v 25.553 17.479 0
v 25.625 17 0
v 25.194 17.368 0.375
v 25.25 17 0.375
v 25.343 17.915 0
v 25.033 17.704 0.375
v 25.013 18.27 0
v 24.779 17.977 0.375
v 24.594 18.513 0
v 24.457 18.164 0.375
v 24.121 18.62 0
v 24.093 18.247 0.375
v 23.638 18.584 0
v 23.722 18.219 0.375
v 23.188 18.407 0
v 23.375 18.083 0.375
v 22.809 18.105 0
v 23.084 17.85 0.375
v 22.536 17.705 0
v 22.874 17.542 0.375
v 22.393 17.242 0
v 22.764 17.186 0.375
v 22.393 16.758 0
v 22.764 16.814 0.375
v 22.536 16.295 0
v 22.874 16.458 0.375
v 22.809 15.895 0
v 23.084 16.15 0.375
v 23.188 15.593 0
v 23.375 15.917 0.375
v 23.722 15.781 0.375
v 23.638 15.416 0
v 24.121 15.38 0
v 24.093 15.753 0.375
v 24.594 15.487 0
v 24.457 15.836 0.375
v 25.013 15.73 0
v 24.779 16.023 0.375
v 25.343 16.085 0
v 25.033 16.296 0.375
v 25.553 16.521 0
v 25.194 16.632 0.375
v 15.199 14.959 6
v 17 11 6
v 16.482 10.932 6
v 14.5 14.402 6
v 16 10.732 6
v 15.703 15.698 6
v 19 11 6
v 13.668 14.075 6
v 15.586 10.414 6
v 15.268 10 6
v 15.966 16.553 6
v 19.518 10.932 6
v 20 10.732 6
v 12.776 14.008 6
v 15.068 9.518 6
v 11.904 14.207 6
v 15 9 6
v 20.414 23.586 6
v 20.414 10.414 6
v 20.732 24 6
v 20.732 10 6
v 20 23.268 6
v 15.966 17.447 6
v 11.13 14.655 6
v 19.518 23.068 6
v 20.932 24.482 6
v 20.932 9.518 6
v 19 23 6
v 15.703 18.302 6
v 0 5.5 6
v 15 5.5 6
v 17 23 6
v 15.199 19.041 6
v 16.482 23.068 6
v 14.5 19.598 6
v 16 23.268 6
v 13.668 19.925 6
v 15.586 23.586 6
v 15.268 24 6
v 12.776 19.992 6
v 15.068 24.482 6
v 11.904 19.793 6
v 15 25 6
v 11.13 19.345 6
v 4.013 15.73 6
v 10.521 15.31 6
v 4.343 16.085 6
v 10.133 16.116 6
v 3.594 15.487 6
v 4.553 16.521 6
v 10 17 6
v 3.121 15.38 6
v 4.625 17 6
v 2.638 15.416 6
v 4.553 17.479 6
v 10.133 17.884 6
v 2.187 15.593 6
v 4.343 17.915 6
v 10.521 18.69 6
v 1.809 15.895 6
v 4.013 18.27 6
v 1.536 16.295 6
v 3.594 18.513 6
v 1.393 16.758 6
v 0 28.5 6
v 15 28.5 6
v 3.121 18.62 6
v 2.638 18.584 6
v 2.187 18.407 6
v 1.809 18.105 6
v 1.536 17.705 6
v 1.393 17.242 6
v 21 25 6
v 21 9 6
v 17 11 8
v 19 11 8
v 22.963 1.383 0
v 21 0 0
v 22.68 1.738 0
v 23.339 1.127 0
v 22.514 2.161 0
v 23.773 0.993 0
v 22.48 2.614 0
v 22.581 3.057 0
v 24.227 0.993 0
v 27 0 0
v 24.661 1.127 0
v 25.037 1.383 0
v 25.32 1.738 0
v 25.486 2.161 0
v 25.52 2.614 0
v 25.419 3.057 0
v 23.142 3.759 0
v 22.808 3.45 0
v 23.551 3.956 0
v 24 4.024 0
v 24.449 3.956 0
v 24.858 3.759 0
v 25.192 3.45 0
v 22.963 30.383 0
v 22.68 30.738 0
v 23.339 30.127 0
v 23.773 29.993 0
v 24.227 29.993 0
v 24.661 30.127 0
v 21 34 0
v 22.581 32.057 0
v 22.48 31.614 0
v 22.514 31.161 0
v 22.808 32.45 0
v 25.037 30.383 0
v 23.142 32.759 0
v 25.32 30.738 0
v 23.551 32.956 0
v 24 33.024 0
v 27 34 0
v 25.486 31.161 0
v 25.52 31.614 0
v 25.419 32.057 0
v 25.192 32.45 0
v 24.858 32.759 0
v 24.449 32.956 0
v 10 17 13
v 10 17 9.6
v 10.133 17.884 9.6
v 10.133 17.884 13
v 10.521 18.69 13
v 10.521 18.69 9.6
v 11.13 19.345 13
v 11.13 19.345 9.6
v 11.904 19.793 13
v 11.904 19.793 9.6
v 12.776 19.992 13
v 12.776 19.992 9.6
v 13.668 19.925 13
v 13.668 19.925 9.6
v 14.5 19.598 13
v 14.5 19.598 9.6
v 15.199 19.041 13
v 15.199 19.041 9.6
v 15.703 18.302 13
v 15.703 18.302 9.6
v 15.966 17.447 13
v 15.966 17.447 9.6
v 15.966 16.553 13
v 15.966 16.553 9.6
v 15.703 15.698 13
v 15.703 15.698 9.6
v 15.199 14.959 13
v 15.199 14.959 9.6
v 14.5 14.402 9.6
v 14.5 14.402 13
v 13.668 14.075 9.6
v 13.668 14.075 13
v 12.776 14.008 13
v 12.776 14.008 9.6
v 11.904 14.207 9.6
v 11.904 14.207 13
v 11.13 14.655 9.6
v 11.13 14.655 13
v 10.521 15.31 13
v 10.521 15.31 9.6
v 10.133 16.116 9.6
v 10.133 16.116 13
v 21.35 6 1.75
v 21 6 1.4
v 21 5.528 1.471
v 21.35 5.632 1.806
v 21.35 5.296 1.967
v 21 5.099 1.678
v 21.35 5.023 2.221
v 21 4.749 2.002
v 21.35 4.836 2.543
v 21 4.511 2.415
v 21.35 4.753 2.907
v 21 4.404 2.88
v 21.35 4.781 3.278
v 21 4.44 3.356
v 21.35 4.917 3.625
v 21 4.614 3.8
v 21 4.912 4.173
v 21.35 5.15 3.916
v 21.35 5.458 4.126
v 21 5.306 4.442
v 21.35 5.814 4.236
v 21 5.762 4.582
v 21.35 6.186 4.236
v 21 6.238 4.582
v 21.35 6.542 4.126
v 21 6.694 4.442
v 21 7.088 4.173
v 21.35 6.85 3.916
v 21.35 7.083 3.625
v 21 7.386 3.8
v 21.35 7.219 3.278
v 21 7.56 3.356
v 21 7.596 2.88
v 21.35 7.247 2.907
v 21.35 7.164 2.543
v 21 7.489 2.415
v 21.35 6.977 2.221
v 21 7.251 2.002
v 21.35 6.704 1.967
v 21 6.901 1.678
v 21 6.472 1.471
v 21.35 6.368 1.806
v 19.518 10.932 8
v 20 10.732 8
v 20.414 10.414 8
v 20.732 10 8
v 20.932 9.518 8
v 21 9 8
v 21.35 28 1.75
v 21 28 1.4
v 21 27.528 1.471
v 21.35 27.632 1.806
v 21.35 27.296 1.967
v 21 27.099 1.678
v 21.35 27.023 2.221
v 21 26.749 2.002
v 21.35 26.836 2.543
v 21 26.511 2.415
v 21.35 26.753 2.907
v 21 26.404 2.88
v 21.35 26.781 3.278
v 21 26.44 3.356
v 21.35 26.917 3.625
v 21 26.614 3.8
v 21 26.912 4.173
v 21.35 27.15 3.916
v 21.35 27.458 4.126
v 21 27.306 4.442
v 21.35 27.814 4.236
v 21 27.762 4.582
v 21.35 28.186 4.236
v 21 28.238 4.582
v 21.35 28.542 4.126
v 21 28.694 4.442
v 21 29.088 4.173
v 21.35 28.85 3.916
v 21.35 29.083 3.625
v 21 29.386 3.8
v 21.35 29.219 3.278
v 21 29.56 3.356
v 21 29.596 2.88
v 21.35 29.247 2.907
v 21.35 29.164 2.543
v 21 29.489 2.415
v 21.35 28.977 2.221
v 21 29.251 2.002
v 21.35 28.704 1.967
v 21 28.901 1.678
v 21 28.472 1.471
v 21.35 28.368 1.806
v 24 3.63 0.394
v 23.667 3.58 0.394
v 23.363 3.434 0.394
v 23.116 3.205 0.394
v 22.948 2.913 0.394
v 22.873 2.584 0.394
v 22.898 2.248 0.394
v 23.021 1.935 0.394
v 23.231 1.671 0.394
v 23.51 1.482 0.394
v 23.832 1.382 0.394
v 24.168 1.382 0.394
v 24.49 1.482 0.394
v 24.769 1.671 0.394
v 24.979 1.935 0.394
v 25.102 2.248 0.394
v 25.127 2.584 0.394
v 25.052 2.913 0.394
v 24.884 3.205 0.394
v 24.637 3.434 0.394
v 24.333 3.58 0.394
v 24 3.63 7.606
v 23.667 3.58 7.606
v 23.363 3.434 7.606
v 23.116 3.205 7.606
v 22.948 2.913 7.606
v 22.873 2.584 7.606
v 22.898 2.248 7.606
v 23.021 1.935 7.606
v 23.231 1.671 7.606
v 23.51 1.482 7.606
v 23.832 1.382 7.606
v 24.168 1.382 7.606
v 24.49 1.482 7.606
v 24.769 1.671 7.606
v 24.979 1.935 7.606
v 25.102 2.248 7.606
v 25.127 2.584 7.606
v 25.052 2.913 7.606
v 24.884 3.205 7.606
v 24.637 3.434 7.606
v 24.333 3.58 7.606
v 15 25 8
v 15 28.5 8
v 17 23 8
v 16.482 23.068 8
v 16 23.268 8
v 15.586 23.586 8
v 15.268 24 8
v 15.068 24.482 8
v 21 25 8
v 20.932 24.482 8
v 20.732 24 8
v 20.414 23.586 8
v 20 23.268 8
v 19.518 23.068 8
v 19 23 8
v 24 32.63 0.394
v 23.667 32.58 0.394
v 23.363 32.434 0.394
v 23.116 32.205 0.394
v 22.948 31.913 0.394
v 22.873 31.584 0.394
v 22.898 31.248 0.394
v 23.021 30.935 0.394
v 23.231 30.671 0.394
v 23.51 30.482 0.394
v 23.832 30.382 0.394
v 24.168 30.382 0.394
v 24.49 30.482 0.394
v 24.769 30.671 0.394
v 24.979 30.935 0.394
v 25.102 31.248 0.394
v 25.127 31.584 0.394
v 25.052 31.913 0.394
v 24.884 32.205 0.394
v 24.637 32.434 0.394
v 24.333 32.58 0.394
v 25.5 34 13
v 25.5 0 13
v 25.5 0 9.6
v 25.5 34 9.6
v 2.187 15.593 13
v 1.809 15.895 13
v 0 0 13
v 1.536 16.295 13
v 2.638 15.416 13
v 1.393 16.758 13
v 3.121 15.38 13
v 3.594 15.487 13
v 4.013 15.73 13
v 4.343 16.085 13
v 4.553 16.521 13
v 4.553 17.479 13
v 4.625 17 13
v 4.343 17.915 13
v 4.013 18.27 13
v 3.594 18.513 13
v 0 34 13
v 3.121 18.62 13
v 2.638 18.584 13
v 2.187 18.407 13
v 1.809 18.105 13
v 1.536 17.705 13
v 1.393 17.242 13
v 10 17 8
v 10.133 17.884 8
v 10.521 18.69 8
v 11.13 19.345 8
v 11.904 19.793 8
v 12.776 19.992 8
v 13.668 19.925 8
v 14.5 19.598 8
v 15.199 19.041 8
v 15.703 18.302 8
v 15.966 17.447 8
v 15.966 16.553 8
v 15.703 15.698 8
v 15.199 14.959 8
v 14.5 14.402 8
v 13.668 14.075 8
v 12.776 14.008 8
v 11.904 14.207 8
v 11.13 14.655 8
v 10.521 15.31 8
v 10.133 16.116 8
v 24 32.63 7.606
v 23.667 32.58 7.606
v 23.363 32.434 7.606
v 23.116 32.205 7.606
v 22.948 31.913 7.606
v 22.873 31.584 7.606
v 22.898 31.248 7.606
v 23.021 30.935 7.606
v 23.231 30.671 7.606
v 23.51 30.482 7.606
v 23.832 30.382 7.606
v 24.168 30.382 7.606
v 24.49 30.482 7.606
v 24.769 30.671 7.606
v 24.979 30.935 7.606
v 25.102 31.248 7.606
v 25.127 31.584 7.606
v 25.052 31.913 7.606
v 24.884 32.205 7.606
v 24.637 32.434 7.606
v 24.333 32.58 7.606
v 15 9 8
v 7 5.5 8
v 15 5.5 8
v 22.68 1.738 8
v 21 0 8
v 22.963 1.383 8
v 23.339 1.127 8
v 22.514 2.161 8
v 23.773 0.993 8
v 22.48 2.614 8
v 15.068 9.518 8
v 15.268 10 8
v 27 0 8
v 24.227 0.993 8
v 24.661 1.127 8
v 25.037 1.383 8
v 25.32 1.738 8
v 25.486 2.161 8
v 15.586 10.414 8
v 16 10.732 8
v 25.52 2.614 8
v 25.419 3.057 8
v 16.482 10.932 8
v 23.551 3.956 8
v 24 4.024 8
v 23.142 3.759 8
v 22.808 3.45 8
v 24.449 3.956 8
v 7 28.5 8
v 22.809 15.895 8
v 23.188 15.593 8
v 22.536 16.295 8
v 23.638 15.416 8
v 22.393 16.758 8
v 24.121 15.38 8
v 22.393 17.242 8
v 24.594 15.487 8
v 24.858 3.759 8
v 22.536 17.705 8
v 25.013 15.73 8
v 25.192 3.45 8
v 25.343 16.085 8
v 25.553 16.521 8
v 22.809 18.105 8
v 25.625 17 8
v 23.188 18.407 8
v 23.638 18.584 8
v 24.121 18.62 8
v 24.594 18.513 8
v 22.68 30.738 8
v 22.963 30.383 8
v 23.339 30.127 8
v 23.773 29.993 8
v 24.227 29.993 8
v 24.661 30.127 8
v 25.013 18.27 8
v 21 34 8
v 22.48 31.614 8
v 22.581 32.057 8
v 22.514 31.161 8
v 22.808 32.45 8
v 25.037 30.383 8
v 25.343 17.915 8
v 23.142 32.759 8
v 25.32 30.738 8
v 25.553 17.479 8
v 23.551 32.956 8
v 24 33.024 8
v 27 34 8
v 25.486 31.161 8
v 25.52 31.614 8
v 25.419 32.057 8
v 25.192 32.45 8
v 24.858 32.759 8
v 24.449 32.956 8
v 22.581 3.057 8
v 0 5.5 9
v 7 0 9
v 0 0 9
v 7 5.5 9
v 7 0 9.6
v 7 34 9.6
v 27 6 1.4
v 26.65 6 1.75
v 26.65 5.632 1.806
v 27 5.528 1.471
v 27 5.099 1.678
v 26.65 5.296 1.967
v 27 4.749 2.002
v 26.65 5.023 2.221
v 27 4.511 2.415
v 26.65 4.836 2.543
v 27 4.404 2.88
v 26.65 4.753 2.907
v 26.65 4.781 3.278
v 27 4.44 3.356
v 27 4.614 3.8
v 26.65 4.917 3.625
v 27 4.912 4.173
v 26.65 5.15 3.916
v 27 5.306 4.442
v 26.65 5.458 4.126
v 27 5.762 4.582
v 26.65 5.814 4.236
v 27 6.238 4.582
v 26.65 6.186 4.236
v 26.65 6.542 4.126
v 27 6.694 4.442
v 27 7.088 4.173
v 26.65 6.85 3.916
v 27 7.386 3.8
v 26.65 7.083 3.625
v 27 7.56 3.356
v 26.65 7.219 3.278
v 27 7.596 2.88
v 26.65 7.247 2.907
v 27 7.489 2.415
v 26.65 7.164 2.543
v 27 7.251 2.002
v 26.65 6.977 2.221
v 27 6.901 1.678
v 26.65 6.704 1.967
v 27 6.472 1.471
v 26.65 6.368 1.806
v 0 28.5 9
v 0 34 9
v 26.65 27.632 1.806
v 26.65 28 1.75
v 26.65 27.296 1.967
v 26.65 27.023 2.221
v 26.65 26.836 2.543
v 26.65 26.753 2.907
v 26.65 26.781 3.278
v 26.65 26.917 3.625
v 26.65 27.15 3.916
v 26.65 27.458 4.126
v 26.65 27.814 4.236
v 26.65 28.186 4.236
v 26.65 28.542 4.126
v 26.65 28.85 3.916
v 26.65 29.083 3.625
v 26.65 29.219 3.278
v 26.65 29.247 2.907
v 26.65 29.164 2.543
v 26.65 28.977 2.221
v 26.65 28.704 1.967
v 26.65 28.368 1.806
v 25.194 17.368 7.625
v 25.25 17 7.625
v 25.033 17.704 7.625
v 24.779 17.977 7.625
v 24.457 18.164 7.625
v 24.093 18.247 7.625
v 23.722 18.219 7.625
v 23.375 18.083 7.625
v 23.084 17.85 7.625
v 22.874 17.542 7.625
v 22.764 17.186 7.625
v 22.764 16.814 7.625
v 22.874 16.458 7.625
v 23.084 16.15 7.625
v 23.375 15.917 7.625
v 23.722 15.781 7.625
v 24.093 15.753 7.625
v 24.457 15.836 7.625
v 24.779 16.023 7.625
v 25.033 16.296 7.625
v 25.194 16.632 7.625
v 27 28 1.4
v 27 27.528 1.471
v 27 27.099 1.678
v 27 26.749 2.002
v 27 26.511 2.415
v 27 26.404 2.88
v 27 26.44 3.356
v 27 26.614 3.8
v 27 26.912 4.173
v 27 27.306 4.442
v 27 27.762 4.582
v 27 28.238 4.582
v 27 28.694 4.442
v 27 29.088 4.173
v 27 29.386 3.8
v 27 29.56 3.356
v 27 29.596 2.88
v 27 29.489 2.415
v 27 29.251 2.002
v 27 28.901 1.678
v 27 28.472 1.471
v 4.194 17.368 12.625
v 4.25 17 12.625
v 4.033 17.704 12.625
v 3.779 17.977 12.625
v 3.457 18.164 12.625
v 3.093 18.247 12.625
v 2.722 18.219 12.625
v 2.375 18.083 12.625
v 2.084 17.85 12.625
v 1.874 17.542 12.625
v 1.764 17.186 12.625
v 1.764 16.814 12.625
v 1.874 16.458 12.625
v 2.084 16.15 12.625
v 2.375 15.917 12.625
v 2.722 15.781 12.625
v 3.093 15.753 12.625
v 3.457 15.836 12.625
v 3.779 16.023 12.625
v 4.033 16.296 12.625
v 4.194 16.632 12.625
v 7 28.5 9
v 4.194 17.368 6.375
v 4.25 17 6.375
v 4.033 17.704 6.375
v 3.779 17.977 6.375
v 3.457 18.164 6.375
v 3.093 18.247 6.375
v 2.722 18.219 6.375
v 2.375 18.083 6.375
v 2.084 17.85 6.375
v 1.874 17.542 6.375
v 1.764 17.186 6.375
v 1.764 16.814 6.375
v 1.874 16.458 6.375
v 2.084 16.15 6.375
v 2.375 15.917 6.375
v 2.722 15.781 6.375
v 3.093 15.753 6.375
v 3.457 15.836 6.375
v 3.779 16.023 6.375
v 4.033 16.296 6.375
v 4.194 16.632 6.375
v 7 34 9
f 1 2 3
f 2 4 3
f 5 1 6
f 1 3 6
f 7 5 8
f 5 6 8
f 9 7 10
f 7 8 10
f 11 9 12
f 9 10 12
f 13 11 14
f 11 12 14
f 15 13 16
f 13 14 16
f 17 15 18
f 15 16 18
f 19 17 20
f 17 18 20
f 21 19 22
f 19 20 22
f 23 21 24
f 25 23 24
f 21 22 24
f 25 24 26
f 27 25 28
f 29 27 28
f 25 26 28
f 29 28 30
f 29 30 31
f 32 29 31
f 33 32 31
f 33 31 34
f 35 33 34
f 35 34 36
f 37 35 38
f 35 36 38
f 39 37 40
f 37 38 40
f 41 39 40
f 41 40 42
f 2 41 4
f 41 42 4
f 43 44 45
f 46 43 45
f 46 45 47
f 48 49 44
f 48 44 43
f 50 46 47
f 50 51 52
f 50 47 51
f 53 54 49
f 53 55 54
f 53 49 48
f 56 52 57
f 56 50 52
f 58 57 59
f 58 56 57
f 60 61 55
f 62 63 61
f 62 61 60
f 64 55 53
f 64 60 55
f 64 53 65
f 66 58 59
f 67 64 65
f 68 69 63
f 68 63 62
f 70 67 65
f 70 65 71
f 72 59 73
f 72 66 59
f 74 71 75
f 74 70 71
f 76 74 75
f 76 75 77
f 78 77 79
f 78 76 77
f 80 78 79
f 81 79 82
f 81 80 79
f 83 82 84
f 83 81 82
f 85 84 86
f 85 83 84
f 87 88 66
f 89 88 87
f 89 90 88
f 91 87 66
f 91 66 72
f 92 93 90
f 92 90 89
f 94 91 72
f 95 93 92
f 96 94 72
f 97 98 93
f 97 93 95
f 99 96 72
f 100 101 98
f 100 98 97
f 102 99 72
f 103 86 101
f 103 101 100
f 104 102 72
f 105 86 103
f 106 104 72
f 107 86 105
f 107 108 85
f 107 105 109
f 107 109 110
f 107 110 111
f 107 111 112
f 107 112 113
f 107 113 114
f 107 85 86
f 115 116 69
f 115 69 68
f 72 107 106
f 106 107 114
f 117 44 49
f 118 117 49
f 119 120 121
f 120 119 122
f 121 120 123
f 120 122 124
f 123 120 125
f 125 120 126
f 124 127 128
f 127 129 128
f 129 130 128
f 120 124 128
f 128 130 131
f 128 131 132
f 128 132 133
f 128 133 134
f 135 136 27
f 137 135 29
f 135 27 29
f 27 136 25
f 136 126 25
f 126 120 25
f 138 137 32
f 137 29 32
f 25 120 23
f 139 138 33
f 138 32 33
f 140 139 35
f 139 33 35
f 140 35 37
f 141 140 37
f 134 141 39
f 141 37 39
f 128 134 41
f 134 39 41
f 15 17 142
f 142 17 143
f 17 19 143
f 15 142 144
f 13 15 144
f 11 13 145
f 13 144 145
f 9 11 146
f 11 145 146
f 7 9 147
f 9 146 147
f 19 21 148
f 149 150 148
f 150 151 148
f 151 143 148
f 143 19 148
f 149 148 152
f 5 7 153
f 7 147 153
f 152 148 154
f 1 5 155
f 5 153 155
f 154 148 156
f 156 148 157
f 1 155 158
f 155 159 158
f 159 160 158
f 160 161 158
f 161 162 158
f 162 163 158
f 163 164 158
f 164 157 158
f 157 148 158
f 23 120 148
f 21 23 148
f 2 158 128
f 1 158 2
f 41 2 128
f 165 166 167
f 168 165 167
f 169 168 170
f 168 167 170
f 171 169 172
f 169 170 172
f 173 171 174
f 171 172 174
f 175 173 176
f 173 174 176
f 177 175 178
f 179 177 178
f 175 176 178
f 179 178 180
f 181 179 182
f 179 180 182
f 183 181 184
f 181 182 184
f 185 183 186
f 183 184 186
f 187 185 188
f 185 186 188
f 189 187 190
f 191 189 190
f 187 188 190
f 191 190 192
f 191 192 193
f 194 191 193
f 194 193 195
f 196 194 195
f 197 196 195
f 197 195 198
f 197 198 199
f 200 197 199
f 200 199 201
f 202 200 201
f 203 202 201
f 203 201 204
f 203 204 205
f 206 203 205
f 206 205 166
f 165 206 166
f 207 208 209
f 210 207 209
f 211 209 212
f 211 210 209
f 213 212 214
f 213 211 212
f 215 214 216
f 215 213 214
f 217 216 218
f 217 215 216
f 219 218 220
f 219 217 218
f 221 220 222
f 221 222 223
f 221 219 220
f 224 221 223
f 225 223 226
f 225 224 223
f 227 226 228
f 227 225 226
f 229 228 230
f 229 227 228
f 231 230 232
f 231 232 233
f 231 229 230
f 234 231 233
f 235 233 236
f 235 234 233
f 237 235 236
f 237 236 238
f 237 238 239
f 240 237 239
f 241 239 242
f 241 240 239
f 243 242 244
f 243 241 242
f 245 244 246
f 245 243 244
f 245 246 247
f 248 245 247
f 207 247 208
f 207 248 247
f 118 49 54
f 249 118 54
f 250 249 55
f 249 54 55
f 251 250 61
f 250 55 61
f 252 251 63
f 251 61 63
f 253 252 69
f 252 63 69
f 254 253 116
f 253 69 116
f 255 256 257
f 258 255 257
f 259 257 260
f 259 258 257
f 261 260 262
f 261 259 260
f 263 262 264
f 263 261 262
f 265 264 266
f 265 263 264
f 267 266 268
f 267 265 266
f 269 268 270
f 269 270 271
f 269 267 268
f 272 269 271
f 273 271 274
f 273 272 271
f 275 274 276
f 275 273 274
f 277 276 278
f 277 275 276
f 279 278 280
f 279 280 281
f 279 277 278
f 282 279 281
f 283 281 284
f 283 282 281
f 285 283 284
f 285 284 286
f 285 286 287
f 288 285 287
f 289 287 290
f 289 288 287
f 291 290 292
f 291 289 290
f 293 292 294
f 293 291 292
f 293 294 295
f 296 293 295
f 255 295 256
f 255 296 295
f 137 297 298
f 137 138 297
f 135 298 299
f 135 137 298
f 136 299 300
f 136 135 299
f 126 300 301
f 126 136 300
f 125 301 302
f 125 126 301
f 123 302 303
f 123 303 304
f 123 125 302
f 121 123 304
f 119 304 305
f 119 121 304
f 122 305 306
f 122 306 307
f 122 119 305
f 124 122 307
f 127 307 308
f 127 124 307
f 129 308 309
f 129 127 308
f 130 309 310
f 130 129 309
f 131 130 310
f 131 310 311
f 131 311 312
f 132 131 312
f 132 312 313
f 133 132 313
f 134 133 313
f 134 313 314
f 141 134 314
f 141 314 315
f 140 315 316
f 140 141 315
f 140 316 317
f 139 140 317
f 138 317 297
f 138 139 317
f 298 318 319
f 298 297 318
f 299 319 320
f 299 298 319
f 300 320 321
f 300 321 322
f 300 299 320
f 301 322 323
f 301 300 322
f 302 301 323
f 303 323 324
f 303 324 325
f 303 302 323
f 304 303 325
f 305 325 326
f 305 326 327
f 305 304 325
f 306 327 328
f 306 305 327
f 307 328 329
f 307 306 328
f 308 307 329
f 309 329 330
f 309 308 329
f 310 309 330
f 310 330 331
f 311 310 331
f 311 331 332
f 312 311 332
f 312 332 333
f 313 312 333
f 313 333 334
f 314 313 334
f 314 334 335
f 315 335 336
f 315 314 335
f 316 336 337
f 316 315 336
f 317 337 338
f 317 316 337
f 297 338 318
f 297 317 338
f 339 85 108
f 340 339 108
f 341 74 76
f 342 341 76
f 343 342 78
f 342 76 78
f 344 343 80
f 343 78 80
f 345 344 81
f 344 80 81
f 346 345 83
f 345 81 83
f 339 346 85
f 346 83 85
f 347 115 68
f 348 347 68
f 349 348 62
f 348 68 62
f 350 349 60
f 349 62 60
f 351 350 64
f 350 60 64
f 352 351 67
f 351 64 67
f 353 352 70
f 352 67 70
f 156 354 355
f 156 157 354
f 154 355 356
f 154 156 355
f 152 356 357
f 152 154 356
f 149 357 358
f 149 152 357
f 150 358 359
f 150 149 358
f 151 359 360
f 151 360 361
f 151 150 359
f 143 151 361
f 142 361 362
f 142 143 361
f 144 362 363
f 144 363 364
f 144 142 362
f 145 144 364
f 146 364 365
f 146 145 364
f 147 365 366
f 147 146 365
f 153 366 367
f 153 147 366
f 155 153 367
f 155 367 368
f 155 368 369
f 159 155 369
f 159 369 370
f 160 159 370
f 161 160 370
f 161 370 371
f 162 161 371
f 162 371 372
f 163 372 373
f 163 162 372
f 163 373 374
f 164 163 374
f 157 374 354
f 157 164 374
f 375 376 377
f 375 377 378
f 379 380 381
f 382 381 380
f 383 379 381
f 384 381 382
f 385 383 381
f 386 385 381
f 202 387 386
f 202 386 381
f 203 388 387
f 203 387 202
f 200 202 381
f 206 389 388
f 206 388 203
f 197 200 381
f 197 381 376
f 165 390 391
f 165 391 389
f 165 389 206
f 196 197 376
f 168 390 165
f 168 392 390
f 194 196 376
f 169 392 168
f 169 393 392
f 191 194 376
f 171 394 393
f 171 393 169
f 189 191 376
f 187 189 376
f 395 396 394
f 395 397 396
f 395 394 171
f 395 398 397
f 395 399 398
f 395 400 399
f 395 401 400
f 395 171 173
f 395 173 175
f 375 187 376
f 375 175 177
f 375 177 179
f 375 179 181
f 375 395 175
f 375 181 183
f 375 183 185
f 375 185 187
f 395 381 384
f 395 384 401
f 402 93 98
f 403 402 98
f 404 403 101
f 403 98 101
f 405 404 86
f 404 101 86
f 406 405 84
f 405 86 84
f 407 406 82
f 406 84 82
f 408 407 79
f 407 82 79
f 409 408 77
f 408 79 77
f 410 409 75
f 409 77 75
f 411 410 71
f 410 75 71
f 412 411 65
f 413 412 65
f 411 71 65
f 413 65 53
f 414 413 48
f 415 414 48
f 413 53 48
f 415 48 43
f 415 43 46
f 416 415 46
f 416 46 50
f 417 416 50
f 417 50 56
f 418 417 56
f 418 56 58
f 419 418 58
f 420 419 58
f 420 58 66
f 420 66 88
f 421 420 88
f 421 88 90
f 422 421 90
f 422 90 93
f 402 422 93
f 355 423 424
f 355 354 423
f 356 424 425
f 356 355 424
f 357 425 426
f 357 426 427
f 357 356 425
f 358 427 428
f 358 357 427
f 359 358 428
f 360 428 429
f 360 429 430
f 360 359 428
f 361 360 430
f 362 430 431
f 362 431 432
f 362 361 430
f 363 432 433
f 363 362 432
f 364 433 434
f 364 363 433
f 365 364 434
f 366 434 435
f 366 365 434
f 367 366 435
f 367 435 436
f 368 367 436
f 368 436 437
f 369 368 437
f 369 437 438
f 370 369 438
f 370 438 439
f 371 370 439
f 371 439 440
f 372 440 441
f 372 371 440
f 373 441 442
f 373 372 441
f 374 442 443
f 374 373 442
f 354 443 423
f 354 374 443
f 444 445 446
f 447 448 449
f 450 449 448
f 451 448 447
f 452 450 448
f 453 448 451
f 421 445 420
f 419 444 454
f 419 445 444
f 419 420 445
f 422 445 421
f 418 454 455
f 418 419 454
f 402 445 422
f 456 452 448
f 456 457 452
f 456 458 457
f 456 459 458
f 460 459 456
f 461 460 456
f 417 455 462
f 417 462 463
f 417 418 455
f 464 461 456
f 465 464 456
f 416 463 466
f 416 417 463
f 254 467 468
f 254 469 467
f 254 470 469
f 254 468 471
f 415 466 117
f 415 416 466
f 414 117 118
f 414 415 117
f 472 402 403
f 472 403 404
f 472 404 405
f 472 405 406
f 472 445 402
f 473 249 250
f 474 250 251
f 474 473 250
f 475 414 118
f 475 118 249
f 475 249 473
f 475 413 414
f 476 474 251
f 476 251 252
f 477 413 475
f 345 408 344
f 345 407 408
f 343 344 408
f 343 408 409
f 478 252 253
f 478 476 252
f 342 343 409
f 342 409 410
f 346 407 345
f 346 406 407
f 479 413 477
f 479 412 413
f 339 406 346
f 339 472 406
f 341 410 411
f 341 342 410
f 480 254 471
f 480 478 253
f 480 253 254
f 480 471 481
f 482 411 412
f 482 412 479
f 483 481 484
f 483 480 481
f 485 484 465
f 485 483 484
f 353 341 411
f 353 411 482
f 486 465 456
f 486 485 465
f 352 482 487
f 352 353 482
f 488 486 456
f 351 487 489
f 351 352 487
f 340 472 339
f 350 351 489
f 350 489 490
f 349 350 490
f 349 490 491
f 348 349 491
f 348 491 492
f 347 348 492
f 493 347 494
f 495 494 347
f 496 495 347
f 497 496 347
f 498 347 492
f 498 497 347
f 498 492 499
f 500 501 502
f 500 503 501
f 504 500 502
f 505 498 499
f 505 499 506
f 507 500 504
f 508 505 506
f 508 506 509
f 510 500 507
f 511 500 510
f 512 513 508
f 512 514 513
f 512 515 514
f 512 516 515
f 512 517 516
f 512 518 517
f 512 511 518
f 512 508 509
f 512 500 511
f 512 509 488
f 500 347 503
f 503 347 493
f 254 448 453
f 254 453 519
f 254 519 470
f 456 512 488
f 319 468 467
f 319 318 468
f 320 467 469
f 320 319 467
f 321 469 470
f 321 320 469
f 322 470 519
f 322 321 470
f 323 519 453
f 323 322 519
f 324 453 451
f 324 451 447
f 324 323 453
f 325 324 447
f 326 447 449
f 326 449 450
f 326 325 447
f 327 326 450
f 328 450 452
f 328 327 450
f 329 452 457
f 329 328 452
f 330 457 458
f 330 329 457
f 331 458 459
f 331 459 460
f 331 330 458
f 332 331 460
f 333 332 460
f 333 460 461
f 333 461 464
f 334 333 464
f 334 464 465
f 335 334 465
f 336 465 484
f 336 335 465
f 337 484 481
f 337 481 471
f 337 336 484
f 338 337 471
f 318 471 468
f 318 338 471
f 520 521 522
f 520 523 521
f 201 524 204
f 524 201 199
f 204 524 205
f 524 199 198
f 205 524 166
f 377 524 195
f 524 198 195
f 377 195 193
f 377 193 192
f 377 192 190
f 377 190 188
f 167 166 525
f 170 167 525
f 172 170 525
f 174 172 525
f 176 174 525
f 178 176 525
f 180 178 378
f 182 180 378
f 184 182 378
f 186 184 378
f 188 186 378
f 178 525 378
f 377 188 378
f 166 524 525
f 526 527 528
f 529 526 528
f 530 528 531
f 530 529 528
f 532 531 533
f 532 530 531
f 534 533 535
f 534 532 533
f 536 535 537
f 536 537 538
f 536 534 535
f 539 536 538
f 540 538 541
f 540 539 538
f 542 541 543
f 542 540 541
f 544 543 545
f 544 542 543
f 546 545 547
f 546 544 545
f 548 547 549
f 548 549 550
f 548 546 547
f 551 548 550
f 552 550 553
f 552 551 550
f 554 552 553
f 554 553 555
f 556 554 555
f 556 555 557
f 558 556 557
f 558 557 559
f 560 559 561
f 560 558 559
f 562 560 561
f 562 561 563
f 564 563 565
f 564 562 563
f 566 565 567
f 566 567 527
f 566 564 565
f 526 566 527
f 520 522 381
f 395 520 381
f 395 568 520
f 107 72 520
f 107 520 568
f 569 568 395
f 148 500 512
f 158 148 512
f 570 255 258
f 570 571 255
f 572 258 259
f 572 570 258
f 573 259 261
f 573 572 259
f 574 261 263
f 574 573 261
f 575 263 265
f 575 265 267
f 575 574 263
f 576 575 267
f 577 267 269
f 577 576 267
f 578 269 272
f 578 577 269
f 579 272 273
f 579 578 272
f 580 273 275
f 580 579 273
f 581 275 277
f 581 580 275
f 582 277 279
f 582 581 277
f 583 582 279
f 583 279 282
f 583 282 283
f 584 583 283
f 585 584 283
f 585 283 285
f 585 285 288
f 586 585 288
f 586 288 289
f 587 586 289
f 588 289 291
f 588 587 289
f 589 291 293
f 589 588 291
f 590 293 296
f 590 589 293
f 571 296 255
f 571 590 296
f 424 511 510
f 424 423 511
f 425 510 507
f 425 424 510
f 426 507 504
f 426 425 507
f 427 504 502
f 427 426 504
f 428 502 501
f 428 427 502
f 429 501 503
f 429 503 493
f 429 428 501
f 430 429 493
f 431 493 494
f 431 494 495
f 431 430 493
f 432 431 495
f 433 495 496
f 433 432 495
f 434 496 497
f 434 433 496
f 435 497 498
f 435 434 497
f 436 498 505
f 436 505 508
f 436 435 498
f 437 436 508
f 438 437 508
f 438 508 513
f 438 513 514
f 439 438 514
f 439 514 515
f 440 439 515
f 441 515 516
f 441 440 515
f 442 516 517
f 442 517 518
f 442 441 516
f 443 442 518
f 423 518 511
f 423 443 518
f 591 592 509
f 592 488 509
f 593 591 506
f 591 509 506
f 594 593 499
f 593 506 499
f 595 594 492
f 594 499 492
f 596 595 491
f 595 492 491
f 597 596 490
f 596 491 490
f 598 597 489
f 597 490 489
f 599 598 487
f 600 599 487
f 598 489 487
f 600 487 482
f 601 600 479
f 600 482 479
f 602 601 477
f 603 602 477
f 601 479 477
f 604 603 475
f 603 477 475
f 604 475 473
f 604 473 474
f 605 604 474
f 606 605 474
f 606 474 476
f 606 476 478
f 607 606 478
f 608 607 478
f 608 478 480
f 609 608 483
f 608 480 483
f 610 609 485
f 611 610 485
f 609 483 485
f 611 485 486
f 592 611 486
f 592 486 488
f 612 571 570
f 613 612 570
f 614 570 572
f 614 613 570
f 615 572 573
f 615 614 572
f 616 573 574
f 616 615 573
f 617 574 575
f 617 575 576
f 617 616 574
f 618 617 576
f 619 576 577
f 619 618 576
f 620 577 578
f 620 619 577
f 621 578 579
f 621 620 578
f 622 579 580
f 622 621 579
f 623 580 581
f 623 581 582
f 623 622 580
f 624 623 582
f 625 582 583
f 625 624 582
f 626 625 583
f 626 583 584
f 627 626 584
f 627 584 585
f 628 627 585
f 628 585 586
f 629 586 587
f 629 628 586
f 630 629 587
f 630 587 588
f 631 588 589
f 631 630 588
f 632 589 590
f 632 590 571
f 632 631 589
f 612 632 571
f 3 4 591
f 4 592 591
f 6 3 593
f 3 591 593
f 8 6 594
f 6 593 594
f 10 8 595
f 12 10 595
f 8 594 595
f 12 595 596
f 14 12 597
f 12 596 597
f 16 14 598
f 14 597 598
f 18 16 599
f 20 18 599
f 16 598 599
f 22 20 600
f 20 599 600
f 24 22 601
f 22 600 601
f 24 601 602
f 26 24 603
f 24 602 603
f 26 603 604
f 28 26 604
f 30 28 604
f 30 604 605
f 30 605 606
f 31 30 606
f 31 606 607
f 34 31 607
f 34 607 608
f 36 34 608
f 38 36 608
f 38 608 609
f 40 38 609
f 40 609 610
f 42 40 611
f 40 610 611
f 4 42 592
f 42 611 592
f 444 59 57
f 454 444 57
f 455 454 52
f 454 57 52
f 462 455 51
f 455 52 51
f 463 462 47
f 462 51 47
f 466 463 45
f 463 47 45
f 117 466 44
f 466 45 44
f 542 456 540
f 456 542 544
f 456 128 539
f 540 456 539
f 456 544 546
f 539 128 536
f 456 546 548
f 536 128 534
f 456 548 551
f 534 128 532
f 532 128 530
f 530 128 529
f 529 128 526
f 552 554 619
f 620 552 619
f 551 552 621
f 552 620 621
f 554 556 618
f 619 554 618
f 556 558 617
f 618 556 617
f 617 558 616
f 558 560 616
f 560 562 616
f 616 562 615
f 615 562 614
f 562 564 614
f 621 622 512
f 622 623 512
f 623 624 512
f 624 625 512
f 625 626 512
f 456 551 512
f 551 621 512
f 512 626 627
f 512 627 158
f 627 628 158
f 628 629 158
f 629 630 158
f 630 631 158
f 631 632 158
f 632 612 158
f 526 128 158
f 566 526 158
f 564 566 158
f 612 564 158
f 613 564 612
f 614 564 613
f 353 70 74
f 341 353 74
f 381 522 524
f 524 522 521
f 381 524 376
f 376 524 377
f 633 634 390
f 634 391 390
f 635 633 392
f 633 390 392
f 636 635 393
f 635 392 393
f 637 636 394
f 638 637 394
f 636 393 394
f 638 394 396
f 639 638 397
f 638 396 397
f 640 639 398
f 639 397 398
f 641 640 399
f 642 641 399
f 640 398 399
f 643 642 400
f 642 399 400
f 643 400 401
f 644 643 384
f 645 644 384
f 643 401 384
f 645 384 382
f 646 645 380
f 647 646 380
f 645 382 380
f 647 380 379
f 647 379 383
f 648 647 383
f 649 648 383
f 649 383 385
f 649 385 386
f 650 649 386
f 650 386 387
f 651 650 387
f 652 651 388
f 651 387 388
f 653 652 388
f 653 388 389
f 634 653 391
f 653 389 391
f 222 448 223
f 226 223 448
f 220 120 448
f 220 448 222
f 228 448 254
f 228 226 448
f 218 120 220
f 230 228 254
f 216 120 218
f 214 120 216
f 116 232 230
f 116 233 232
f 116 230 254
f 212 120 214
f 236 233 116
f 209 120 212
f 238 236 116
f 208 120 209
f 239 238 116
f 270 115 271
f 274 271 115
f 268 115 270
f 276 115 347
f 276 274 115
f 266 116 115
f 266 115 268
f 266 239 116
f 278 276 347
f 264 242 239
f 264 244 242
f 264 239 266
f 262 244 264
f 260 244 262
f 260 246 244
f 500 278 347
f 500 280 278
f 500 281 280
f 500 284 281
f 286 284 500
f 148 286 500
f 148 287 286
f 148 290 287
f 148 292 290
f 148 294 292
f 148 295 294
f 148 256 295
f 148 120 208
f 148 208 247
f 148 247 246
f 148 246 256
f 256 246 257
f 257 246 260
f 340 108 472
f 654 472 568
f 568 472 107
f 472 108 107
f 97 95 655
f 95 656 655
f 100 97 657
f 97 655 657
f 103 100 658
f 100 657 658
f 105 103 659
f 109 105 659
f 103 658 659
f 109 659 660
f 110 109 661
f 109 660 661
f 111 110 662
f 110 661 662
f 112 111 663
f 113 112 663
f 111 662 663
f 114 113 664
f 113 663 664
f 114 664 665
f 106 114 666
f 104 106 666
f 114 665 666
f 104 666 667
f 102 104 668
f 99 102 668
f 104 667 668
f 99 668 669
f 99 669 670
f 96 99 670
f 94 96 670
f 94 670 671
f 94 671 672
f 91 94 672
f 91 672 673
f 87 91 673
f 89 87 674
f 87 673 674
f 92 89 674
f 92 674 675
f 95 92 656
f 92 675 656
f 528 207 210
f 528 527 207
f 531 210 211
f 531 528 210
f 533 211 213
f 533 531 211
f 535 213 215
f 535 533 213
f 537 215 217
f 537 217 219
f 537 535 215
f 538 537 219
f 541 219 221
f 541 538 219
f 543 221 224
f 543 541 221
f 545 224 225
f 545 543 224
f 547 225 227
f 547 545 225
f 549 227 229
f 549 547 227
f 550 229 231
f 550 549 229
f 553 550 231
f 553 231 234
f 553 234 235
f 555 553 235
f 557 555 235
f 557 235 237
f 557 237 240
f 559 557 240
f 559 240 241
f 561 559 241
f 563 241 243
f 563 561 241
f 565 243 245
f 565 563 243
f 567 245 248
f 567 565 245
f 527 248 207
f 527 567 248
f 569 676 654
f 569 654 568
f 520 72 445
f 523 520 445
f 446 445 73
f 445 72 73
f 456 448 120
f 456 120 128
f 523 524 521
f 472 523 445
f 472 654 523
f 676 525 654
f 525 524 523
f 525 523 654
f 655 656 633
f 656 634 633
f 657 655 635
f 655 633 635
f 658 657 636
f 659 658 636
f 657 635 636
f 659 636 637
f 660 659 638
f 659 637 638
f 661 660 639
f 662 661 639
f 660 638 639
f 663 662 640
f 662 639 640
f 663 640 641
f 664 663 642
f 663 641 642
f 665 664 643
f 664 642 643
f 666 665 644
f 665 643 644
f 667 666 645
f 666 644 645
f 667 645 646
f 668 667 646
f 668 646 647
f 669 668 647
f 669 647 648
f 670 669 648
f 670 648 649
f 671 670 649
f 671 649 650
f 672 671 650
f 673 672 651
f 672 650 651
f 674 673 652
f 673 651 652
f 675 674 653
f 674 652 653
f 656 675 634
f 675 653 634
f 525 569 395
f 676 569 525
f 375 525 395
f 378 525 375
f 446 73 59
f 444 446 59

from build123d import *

# Parameters (mm, degrees)
SKETCH_1_W                   = 27
SKETCH_1_H                   = 34
EXTRUDE_1_DEPTH              = 13
SKETCH_2_W                   = 20
SKETCH_2_H                   = 1.6
CUT_EXTRUDE_1_DEPTH          = 46.321076774
CUT_EXTRUDE_2_DEPTH          = 9
CUT_EXTRUDE_3_REACH          = 47.321
SKETCH_4_W                   = 1.5
SKETCH_4_H                   = 34
SKETCH_12_W                  = 21
SKETCH_12_H                  = 34
CUT_EXTRUDE_7_DEPTH          = 6
SKETCH_8_R                   = 3
CUT_EXTRUDE_4_DEPTH          = 46.321076774
HOLE_WIZARD_M31_AT_2_COUNT   = 2
HOLE_WIZARD_M31_AT_2_PITCH   = 22
HOLE_WIZARD_4_401_AT_2_COUNT = 2
HOLE_WIZARD_4_401_AT_2_PITCH = 29


# Read off the part's stored shape, not the designer's step: Отверстие обработанное метчиком M3x0.52
with BuildPart() as part:
    # Эскиз1 → Вытянуть1 (new body)
    with BuildSketch(Plane.XY):
        with Locations((13.5, 17)):
            Rectangle(SKETCH_1_W, SKETCH_1_H)
    extrude(amount=EXTRUDE_1_DEPTH)

    # Эскиз2 → Вырез-Вытянуть1 (cut, through all)
    with BuildSketch(Plane(origin=(0, 34, 0), x_dir=(1, 0, 0), z_dir=(0, 1, 0))):
        with Locations((17, -8.8)):
            Rectangle(SKETCH_2_W, SKETCH_2_H)
    extrude(amount=-CUT_EXTRUDE_1_DEPTH, mode=Mode.SUBTRACT)

    # Эскиз3 → Вырез-Вытянуть2 (cut)
    with BuildSketch(Plane(origin=(0, 0, 0), x_dir=(-1, 0, 0), z_dir=(0, 0, -1))):
        with BuildLine():
            Line((0, 34), (-21, 34))
            Line((-21, 34), (-21, 25))
            ThreePointArc((-21, 25), (-20.414213562, 23.585786438), (-19, 23))
            Line((-19, 23), (-17, 23))
            ThreePointArc((-17, 23), (-15.585786438, 23.585786438), (-15, 25))
            Line((-15, 25), (-15, 28.5))
            Line((-15, 28.5), (0, 28.5))
            Line((0, 28.5), (0, 34))
        make_face()
        with BuildLine():
            Line((0, 0), (0, 5.5))
            Line((0, 5.5), (-15, 5.5))
            Line((-15, 5.5), (-15, 9))
            ThreePointArc((-15, 9), (-15.585786438, 10.414213562), (-17, 11))
            Line((-17, 11), (-19, 11))
            ThreePointArc((-19, 11), (-20.414213562, 10.414213562), (-21, 9))
            Line((-21, 9), (-21, 0))
            Line((-21, 0), (0, 0))
        make_face()
    extrude(amount=-CUT_EXTRUDE_2_DEPTH, mode=Mode.SUBTRACT)

    # Эскиз4 → Вырез-Вытянуть3 (cut, up to next)
    with BuildSketch(Plane.XY.offset(13), mode=Mode.PRIVATE) as cut_extrude_3_sk1:
        with Locations((26.25, 17)):
            Rectangle(SKETCH_4_W, SKETCH_4_H)
    cut_extrude_3_tool1 = extrude(cut_extrude_3_sk1.sketch, amount=-CUT_EXTRUDE_3_REACH, mode=Mode.PRIVATE) & part.part
    add(cut_extrude_3_tool1.solids().sort_by_distance((26.25, 17, 13))[0], mode=Mode.SUBTRACT)

    # Эскиз12 → Вырез-Вытянуть7 (cut)
    with BuildSketch(Plane(origin=(0, 0, 0), x_dir=(-1, 0, 0), z_dir=(0, 0, -1))):
        with Locations((-10.5, 17)):
            Rectangle(SKETCH_12_W, SKETCH_12_H)
    extrude(amount=-CUT_EXTRUDE_7_DEPTH, mode=Mode.SUBTRACT)

    # Эскиз8 → Вырез-Вытянуть4 (cut, through all)
    with BuildSketch(Plane(origin=(0, 0, 0), x_dir=(-1, 0, 0), z_dir=(0, 0, -1))):
        with Locations((-13, 17)):
            Circle(SKETCH_8_R)
    extrude(amount=-CUT_EXTRUDE_4_DEPTH, mode=Mode.SUBTRACT)

    # Эскиз19 → Отверстие обработанное метчиком M31 (revolve, cut)
    with BuildSketch(Plane(origin=(27, 28, 3), x_dir=(0, 0, -1), z_dir=(0, 1, 0))):
        Polygon((0, 0), (0, 6), (1.6, 6), (1.25, 5.65), (1.25, 0.35), (1.6, 0), align=None)
    hole_wizard_m31 = revolve(axis=Axis((33.35, 28, 3), (-1, 0, 0)), mode=Mode.SUBTRACT)

    # Отверстие обработанное метчиком M31 at 2: Отверстие обработанное метчиком M31 ×2
    with Locations(*[(0, -i * HOLE_WIZARD_M31_AT_2_PITCH, 0) for i in range(1, HOLE_WIZARD_M31_AT_2_COUNT)]):
        add(hole_wizard_m31, mode=Mode.SUBTRACT)

    # Отверстие обработанное метчиком M3x0.52 outline → Отверстие обработанное метчиком M3x0.52 (revolve, cut)
    with BuildSketch(Plane(origin=(24, 17, 0), x_dir=(1, 0, 0), z_dir=(0, -1, 0))):
        Polygon((1.625, 8), (0, 8), (0, 0), (1.625, 0), (1.25, 0.375), (1.25, 7.625), align=None)
    revolve(axis=Axis((24, 17, 0), (0, 0, 1)), mode=Mode.SUBTRACT)

    # M3x0.52 2 outline → M3x0.52 2 (revolve, cut)
    with BuildSketch(Plane(origin=(3, 17, 0), x_dir=(1, 0, 0), z_dir=(0, -1, 0))):
        Polygon((1.625, 13), (0, 13), (0, 6), (1.625, 6), (1.25, 6.375), (1.25, 12.625), align=None)
    revolve(axis=Axis((3, 17, 0), (0, 0, 1)), mode=Mode.SUBTRACT)

    # Эскиз24 → Отверстие обработанное метчиком #4-401 (revolve, cut)
    with BuildSketch(Plane(origin=(24, 2.5, 0), x_dir=(0, 1, 0), z_dir=(1, 0, 0))):
        Polygon((0, 0), (0, 8), (1.524, 8), (1.1303, 7.6063), (1.1303, 0.3937), (1.524, 0), align=None)
    hole_wizard_4_401 = revolve(axis=Axis((24, 2.5, -6.35), (0, 0, 1)), mode=Mode.SUBTRACT)

    # Отверстие обработанное метчиком #4-401 at 2: Отверстие обработанное метчиком #4-401 ×2
    with Locations(*[(0, i * HOLE_WIZARD_4_401_AT_2_PITCH, 0) for i in range(1, HOLE_WIZARD_4_401_AT_2_COUNT)]):
        add(hole_wizard_4_401, mode=Mode.SUBTRACT)


solid = part.part
